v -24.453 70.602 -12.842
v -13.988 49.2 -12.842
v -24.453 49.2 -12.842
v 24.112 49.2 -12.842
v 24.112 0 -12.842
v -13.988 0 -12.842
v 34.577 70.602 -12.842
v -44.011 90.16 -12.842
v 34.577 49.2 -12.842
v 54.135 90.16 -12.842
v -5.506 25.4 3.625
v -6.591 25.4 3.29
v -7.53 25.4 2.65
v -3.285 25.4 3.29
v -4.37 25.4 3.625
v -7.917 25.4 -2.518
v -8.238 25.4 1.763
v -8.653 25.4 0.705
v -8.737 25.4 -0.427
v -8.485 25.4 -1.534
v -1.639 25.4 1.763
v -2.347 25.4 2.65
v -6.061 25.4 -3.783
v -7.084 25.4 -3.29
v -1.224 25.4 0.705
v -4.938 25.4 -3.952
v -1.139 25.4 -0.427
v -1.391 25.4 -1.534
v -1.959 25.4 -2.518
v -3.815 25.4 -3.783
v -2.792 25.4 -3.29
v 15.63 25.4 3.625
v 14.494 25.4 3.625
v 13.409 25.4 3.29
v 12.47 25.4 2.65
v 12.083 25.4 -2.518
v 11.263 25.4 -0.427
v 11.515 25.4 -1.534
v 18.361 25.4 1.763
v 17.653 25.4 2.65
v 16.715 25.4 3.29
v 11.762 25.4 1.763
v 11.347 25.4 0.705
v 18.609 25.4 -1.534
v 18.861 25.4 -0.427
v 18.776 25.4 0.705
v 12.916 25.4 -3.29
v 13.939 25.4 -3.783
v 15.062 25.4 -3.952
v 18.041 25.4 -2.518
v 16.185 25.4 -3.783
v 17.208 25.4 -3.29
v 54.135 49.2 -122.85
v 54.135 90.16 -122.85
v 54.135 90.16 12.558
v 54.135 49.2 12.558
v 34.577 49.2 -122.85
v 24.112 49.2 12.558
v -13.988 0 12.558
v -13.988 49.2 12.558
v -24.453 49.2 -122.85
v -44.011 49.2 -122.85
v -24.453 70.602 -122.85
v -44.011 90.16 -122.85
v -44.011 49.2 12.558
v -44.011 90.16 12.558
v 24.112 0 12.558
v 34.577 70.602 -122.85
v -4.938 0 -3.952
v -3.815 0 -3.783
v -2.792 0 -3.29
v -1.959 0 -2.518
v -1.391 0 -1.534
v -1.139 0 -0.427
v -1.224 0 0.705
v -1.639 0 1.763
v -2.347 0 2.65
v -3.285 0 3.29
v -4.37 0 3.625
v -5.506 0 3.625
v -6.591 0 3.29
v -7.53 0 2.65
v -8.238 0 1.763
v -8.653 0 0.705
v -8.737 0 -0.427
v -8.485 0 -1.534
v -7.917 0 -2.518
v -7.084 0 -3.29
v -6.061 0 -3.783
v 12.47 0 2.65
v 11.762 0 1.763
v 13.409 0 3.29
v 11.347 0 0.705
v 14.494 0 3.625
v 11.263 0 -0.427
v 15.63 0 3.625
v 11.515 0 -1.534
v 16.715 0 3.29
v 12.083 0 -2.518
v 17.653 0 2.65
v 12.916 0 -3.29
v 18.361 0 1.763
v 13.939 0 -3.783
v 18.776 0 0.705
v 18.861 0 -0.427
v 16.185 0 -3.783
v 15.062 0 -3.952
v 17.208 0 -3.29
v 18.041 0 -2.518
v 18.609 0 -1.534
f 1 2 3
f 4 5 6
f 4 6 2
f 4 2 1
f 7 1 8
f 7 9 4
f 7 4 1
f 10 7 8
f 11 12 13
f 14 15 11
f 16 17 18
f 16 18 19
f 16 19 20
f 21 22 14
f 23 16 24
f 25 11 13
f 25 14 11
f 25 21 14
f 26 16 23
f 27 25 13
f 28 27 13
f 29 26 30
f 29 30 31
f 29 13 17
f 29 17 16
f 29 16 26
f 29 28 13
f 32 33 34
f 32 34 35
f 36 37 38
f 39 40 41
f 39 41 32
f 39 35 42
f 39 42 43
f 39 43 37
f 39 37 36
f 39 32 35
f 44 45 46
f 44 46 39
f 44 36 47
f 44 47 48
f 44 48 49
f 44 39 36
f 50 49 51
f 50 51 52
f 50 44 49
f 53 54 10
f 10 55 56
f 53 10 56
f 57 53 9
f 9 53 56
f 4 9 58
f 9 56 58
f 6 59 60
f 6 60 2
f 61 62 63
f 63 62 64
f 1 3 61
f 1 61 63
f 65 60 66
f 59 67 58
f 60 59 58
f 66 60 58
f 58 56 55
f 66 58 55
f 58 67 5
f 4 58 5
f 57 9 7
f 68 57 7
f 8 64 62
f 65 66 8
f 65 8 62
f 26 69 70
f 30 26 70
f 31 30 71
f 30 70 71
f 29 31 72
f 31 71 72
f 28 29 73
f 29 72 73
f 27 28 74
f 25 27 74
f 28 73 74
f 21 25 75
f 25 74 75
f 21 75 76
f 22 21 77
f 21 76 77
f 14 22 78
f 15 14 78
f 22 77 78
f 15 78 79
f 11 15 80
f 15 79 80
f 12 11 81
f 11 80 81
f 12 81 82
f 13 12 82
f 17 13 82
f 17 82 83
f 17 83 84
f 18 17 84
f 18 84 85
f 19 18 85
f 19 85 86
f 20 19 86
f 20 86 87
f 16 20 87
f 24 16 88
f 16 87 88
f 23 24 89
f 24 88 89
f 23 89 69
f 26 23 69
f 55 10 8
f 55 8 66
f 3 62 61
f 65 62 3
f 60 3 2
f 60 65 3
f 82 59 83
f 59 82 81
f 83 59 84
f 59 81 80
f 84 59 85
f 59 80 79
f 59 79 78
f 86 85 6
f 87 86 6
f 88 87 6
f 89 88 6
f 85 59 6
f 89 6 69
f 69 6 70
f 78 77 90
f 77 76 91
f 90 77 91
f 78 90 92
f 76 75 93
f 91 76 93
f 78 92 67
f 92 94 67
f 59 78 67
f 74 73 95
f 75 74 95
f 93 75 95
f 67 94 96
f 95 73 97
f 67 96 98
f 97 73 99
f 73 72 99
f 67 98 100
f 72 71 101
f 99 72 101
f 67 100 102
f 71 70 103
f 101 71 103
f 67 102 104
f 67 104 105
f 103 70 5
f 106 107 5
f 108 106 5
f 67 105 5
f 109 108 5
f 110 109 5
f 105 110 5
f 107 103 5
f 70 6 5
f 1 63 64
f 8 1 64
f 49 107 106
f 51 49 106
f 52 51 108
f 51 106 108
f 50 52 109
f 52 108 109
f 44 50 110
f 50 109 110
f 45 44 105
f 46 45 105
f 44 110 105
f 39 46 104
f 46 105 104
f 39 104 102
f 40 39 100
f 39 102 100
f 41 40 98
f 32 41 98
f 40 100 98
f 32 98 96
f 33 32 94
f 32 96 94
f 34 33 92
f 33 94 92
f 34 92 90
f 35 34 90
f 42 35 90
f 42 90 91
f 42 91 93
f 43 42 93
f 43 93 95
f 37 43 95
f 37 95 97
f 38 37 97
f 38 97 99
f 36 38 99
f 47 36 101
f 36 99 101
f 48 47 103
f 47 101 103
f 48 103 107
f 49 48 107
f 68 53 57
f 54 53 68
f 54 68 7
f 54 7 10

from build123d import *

# Parameters (mm, degrees)
SKETCH1_W           = 38.1
SKETCH1_H           = 25.4
BOSS_EXTRUDE1_DEPTH = 90.1598
SKETCH2_W           = 25.4
SKETCH2_H           = 40.96
BOSS_EXTRUDE2_DEPTH = 30.0228
SKETCH3_W           = 25.4
SKETCH3_H           = 40.96
BOSS_EXTRUDE3_DEPTH = 30.0228
BOSS_EXTRUDE4_DEPTH = 110.0074
BOSS_EXTRUDE5_DEPTH = 110.0074
SKETCH8_R           = 3.81
CUT_EXTRUDE1_DEPTH  = 25.4


with BuildPart() as part:
    # Sketch1 → Boss-Extrude1 (new body)
    with BuildSketch(Plane(origin=(0, 0, 0), x_dir=(1, 0, 0), z_dir=(0, 1, 0))):
        with Locations((5.061883246, 0.142486096)):
            Rectangle(SKETCH1_W, SKETCH1_H)
    extrude(amount=BOSS_EXTRUDE1_DEPTH)

    # Sketch2 → Boss-Extrude2 (add)
    with BuildSketch(Plane(origin=(24.111883246, 0, 0), x_dir=(0, 0, -1), z_dir=(1, 0, 0))):
        with Locations((0.142486096, 69.6798)):
            Rectangle(SKETCH2_W, SKETCH2_H)
    extrude(amount=BOSS_EXTRUDE2_DEPTH)

    # Sketch3 → Boss-Extrude3 (add)
    with BuildSketch(Plane.ZY.offset(13.988116754)):
        with Locations((-0.142486096, 69.6798)):
            Rectangle(SKETCH3_W, SKETCH3_H)
    extrude(amount=BOSS_EXTRUDE3_DEPTH)

    # Sketch4 → Boss-Extrude4 (add)
    with BuildSketch(Plane(origin=(0, 0, -12.842486096), x_dir=(-1, 0, 0), z_dir=(0, 0, -1))):
        Polygon((-54.134683246, 90.1598), (-54.134683246, 49.1998), (-34.576683246, 49.1998), (-34.576683246, 70.6018), align=None)
    extrude(amount=BOSS_EXTRUDE4_DEPTH)

    # Sketch5 → Boss-Extrude5 (add)
    with BuildSketch(Plane(origin=(0, 0, -12.842486096), x_dir=(-1, 0, 0), z_dir=(0, 0, -1))):
        Polygon((44.010916754, 90.1598), (44.010916754, 49.1998), (24.452916754, 49.1998), (24.452916754, 70.6018), align=None)
    extrude(amount=BOSS_EXTRUDE5_DEPTH)

    # Sketch8 → Cut-Extrude1 (cut)
    with BuildSketch(Plane.XZ):
        with Locations(Location((-4.938116754, -0.142486096, 0), (0, 0, 270))):
            Circle(SKETCH8_R)
        with Locations(Location((15.061883246, -0.142486096, 0), (0, 0, 270))):
            Circle(SKETCH8_R)
    extrude(amount=-CUT_EXTRUDE1_DEPTH, mode=Mode.SUBTRACT)


solid = part.part
